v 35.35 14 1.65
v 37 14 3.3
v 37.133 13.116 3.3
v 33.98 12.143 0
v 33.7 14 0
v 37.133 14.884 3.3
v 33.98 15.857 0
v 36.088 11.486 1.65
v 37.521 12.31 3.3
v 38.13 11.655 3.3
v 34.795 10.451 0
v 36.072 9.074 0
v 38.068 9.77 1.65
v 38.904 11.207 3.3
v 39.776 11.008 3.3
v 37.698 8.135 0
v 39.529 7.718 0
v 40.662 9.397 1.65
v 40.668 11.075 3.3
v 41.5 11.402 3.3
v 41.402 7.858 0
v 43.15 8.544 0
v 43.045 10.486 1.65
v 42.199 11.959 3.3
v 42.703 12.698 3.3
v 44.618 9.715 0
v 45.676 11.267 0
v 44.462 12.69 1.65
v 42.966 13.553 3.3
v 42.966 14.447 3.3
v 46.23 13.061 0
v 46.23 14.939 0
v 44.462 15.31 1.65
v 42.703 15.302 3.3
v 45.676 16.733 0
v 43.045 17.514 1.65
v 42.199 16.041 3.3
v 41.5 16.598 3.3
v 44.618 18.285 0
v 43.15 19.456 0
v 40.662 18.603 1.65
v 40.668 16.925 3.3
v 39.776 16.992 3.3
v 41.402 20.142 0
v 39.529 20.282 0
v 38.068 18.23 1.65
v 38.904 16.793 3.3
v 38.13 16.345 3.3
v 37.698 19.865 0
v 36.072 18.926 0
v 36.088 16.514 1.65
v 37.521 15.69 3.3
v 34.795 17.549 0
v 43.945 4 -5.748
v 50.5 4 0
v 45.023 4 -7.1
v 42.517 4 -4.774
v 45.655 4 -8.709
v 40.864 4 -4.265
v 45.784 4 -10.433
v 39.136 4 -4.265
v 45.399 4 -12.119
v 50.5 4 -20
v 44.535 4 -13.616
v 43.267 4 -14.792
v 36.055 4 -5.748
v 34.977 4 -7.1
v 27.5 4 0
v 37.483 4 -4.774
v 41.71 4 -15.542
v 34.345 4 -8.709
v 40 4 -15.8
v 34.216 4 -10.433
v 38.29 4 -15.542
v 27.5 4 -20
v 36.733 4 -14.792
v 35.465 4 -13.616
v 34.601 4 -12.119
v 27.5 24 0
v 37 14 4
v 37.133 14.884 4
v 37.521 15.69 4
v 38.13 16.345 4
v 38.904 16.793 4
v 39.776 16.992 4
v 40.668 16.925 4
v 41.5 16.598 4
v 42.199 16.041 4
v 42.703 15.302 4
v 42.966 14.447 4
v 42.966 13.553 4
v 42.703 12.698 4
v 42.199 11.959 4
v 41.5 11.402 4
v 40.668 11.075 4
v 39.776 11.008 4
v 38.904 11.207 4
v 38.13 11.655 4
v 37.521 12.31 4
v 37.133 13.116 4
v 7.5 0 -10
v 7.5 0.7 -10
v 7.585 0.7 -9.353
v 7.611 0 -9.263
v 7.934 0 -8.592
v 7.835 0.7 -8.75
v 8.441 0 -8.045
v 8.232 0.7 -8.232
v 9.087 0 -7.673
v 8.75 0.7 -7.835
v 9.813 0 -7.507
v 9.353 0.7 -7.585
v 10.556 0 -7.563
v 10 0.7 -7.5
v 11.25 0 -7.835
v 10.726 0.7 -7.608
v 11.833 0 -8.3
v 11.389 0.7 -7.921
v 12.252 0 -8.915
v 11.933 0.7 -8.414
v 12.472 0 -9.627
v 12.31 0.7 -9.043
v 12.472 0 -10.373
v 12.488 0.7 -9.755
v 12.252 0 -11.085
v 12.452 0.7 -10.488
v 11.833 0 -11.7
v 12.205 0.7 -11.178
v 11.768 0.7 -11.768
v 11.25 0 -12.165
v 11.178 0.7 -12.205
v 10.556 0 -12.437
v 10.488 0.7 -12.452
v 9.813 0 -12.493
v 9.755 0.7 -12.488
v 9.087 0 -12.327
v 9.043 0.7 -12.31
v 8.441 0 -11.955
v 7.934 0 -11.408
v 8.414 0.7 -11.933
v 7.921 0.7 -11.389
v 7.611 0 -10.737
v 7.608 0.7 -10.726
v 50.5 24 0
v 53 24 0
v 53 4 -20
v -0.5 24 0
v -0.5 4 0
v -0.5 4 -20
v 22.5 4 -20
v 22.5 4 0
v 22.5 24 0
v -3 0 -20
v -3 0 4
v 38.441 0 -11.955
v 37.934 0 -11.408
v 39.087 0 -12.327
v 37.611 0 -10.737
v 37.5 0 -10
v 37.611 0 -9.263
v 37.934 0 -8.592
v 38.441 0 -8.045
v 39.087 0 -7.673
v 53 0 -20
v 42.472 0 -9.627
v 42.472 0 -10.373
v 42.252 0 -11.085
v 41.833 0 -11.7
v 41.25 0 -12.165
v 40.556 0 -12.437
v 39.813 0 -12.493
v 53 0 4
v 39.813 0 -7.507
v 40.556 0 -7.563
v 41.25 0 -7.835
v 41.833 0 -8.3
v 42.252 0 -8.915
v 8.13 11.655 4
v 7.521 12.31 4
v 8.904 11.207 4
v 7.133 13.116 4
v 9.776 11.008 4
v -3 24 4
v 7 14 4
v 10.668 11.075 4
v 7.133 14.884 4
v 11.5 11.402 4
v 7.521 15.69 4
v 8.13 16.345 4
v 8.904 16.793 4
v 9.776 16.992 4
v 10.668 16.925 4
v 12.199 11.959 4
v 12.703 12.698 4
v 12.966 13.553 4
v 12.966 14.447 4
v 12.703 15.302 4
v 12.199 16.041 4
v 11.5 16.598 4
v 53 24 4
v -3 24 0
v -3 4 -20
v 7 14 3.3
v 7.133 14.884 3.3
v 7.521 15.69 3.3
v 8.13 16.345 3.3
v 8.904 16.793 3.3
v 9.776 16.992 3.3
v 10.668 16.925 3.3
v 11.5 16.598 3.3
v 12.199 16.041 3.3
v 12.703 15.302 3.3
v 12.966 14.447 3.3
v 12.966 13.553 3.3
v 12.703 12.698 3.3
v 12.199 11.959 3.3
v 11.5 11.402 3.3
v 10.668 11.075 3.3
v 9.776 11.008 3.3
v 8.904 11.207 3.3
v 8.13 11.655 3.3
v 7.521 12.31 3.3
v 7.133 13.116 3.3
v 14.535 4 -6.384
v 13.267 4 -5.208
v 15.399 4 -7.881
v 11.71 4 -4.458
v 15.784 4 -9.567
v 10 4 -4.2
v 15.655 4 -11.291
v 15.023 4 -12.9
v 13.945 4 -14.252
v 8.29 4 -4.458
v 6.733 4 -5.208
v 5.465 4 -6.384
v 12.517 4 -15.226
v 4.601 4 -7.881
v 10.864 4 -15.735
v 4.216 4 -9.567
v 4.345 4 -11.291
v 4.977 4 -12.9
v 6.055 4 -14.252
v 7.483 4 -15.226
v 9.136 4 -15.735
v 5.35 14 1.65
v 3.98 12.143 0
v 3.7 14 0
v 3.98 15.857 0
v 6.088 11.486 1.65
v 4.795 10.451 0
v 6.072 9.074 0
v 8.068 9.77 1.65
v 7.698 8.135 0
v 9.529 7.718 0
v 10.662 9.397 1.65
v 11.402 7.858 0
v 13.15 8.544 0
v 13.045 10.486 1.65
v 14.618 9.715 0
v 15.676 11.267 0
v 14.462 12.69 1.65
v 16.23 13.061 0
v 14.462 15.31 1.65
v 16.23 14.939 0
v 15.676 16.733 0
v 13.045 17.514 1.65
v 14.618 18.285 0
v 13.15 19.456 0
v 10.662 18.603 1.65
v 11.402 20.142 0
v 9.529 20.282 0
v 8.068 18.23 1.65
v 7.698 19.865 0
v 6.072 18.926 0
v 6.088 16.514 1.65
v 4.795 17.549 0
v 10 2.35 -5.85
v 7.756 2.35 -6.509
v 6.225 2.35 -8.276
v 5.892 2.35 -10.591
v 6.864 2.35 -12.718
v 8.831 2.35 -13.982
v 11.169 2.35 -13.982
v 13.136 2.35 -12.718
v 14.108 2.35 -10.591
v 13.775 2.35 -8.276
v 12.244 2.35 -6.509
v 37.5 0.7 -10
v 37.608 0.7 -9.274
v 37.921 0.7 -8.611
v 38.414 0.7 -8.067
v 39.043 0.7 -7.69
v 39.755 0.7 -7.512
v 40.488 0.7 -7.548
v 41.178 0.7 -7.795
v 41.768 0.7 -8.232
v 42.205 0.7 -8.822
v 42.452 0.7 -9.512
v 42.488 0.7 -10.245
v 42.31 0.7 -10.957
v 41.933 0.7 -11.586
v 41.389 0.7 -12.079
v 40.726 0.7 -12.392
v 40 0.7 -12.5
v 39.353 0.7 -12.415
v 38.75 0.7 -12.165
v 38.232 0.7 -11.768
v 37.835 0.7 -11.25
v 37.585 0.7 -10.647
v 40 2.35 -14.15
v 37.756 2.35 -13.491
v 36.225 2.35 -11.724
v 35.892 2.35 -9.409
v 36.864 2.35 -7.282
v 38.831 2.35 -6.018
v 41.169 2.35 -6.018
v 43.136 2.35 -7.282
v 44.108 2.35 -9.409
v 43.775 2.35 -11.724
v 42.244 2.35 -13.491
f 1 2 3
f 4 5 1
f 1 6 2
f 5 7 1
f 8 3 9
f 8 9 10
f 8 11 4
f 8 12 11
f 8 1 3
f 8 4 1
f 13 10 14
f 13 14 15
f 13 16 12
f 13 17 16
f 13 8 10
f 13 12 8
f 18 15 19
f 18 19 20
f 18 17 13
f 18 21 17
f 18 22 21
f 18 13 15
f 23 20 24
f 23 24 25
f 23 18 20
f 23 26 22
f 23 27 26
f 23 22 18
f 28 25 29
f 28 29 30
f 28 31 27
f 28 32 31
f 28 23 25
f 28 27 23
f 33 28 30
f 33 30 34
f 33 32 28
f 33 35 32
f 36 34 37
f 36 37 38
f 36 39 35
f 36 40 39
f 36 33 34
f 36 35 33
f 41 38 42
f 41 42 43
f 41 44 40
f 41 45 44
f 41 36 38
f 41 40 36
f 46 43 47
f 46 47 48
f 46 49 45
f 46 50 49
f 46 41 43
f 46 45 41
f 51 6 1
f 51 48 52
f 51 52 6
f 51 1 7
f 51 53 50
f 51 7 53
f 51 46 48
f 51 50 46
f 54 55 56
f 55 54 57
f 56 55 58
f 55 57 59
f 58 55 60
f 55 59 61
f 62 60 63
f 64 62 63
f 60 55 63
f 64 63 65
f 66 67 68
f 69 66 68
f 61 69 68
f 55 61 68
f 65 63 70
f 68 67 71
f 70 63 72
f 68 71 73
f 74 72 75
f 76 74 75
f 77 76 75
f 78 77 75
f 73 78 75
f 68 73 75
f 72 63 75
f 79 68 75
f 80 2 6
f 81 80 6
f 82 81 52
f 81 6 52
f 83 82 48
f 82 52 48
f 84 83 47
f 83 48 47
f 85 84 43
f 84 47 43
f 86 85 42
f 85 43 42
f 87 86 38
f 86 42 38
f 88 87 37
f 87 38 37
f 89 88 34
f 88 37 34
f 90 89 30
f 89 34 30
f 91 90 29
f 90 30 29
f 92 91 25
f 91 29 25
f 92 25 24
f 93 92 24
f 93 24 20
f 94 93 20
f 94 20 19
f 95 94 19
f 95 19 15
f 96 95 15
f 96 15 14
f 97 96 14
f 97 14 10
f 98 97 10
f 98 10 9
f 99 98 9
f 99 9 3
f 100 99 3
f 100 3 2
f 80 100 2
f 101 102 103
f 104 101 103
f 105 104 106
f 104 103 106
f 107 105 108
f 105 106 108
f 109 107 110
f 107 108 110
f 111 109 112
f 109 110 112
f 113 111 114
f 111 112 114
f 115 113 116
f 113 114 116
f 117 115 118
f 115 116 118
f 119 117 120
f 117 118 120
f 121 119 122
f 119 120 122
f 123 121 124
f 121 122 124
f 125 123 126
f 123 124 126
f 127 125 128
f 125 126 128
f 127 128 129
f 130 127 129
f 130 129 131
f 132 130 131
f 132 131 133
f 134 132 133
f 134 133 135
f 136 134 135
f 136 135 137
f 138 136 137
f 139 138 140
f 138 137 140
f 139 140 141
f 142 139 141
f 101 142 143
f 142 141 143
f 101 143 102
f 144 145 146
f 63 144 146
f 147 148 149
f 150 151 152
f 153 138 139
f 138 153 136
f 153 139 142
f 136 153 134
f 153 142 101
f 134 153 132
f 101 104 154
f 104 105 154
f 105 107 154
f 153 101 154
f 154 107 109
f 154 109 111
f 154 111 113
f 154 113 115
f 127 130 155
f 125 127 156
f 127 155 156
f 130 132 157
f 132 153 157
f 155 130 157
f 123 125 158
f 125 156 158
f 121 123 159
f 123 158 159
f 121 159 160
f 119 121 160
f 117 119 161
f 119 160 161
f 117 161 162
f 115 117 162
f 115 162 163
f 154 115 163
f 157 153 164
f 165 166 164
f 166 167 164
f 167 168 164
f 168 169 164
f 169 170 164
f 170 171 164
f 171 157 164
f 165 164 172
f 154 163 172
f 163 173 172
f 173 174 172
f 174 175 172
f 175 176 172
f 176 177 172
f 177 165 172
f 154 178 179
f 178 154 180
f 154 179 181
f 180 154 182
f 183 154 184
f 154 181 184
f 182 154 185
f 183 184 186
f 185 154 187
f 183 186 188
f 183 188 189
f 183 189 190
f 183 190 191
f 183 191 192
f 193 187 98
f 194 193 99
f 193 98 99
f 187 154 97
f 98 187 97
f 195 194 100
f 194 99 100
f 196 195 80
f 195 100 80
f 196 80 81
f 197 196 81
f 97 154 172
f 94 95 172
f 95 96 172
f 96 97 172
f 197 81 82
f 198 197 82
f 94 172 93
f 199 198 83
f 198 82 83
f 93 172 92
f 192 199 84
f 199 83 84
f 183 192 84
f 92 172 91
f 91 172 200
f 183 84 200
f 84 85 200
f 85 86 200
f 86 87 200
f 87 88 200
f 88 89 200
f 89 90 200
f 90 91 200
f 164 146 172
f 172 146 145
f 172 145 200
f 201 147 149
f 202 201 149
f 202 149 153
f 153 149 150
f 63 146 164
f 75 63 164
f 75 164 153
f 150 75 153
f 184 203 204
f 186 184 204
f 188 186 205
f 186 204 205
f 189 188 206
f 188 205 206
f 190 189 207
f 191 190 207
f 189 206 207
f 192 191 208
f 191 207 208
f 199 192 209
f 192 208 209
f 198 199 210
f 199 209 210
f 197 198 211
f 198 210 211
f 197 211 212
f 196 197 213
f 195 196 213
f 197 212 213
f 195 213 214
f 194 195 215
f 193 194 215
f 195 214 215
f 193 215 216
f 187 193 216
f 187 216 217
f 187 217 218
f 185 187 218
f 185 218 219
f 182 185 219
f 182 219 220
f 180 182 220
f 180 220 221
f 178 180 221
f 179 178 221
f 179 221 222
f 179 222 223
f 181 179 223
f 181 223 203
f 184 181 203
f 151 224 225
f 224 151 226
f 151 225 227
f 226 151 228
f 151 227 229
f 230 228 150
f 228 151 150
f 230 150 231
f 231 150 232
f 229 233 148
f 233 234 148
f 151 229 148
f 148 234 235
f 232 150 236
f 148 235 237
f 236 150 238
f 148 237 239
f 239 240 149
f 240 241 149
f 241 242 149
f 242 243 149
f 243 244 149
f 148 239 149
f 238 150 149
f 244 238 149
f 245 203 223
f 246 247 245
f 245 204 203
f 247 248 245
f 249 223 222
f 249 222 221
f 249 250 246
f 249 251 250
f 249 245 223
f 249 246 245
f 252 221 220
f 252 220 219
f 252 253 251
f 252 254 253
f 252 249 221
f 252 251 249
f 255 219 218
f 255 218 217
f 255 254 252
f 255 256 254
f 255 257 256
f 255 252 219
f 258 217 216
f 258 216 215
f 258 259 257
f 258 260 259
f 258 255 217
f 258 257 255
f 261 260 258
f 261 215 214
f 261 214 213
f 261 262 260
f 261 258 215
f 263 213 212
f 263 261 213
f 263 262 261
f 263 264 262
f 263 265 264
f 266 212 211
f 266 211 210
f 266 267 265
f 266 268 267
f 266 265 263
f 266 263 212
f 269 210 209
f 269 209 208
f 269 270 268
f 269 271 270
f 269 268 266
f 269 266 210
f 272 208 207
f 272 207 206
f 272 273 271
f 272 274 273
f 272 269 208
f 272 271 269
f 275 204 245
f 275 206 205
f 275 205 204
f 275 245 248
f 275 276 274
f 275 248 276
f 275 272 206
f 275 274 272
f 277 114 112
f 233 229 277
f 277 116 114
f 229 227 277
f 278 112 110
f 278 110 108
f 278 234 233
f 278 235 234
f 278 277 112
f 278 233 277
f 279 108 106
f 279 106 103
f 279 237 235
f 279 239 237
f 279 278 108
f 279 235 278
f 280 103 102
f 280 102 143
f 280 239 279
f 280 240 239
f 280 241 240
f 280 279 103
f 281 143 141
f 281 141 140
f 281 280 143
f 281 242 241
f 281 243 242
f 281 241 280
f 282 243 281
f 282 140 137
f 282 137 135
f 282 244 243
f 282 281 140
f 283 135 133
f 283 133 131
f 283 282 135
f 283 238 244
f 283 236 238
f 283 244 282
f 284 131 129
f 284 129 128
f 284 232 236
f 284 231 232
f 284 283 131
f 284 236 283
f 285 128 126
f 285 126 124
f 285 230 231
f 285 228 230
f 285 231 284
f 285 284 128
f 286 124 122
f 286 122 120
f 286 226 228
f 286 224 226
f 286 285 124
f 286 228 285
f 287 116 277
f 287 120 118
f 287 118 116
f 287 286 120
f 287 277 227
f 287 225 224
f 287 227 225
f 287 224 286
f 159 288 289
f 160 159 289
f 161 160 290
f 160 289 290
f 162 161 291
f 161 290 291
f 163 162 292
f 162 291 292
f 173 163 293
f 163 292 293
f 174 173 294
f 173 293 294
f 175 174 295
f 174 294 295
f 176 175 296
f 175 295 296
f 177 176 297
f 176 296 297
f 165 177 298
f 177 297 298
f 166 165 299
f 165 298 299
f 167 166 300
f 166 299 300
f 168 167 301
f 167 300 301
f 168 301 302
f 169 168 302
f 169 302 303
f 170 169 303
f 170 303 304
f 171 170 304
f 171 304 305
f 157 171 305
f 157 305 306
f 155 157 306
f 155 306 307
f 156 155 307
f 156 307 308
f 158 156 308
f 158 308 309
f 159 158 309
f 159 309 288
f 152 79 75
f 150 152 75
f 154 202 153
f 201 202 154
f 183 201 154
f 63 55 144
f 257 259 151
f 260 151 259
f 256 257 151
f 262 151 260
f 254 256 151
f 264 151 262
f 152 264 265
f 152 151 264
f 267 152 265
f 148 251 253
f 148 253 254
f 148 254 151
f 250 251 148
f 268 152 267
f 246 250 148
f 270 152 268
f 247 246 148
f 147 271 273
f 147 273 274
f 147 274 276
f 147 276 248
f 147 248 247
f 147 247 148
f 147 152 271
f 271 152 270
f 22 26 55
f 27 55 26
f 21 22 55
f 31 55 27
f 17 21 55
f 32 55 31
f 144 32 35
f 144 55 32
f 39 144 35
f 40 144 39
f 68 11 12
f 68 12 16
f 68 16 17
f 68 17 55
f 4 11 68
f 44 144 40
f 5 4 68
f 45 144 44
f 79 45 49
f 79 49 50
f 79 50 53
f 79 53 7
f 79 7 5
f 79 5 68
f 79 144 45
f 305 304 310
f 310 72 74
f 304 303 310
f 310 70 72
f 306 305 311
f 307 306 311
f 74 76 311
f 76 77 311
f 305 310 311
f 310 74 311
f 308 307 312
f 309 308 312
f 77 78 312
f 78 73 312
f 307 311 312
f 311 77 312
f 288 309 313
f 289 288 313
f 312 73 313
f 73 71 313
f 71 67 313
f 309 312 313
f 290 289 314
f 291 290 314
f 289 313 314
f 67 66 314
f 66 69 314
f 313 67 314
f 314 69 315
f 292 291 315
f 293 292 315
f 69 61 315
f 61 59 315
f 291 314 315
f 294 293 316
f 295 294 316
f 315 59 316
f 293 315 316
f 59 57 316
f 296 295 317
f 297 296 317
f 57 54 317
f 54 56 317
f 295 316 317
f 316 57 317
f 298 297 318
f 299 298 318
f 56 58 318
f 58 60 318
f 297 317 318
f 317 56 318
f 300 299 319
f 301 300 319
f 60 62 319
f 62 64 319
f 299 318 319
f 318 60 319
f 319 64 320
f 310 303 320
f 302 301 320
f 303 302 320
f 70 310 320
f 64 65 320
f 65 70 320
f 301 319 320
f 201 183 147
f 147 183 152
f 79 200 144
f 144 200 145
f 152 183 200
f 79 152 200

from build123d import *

# Parameters (mm, degrees)
CROQUIS1_R                   = 2.5
SALIENTE_EXTRUIR1_DEPTH      = 4
CROQUIS2_W                   = 50
CROQUIS2_H                   = 4
SALIENTE_EXTRUIR2_DEPTH      = 20
SALIENTE_EXTRUIR3_DEPTH      = 3
SALIENTE_EXTRUIR3_DEPTH_BACK = 53
CROQUIS4_W                   = 23
CROQUIS4_H                   = 20
CORTAR_EXTRUIR1_DEPTH        = 20
CROQUIS5_R                   = 3
CORTAR_EXTRUIR2_DEPTH        = 17
CROQUIS6_R                   = 2.5
CORTAR_EXTRUIR3_DEPTH        = 20


with BuildPart() as part:
    # Croquis1 → Saliente-Extruir1 (new body)
    with BuildSketch(Plane(origin=(0, 0, 0), x_dir=(1, 0, 0), z_dir=(0, 1, 0))):
        Polygon((0, 0), (0, 20), (50, 20), (50, 0), (50, -4), (0, -4), align=None)
        with Locations(Location((10, 10, 0), (0, 0, 270))):
            Circle(CROQUIS1_R, mode=Mode.SUBTRACT)
        with Locations(Location((40, 10, 0), (0, 0, 270))):
            Circle(CROQUIS1_R, mode=Mode.SUBTRACT)
    extrude(amount=SALIENTE_EXTRUIR1_DEPTH)

    # Croquis2 → Saliente-Extruir2 (add)
    with BuildSketch(Plane(origin=(0, 4, 0), x_dir=(1, 0, 0), z_dir=(0, 1, 0))):
        with Locations((25, -2)):
            Rectangle(CROQUIS2_W, CROQUIS2_H)
    extrude(amount=SALIENTE_EXTRUIR2_DEPTH)

    # Croquis3 → Saliente-Extruir3 (add, two sides: drawn at the far end of the back side and taken through both)
    with BuildSketch(Plane.ZY.offset(-SALIENTE_EXTRUIR3_DEPTH_BACK)):
        Polygon((-20, 4), (-20, 0), (4, 0), (4, 24), (0, 24), align=None)
    extrude(amount=SALIENTE_EXTRUIR3_DEPTH + SALIENTE_EXTRUIR3_DEPTH_BACK)

    # Croquis4 → Cortar-Extruir1 (cut)
    with BuildSketch(Plane(origin=(0, 0, -20), x_dir=(-1, 0, 0), z_dir=(0, 0, -1))):
        with Locations((-39, 14)):
            Rectangle(CROQUIS4_W, CROQUIS4_H)
        with Locations((-11, 14)):
            Rectangle(CROQUIS4_W, CROQUIS4_H)
    extrude(amount=-CORTAR_EXTRUIR1_DEPTH, mode=Mode.SUBTRACT)

    # Croquis5 → Cortar-Extruir2 (cut)
    with BuildSketch(Plane(origin=(0, 0, 0), x_dir=(-1, 0, 0), z_dir=(0, 0, -1))):
        with Locations((-40, 14)):
            Circle(CROQUIS5_R)
        with Locations((-10, 14)):
            Circle(CROQUIS5_R)
    extrude(amount=-CORTAR_EXTRUIR2_DEPTH, mode=Mode.SUBTRACT)

    # Croquis6 → Cortar-Extruir3 (cut)
    with BuildSketch(Plane(origin=(0, 4, 0), x_dir=(1, 0, 0), z_dir=(0, 1, 0))):
        with Locations(Location((10, 10, 0), (0, 0, 180))):
            Circle(CROQUIS6_R)
        with Locations(Location((40, 10, 0), (0, 0, 180))):
            Circle(CROQUIS6_R)
    extrude(amount=-CORTAR_EXTRUIR3_DEPTH, mode=Mode.SUBTRACT)

    # Croquis7 → Cortar-Revolución1 (revolve, cut)
    with BuildSketch(Plane.XY.offset(-10), mode=Mode.PRIVATE) as cortar_revoluci_n1_sk:
        Polygon((40, 0.7), (37.5, 0.7), (34.2, 4), (40, 4), align=None)
    revolve(cortar_revoluci_n1_sk.sketch.rotate(Axis((40, 0.7, -10), (0, 1, 0)), 270), axis=Axis((40, 0.7, -10), (0, 1, 0)), mode=Mode.SUBTRACT)

    # Croquis8 → Cortar-Revolución2 (revolve, cut)
    with BuildSketch(Plane.XY.offset(-10), mode=Mode.PRIVATE) as cortar_revoluci_n2_sk:
        Polygon((10, 4), (10, 0.7), (12.5, 0.7), (15.8, 4), align=None)
    revolve(cortar_revoluci_n2_sk.sketch.rotate(Axis((10, 4, -10), (0, -1, 0)), 90), axis=Axis((10, 4, -10), (0, -1, 0)), mode=Mode.SUBTRACT)

    # Croquis9 → Cortar-Revolución3 (revolve, cut)
    with BuildSketch(Plane(origin=(0, 14, 0), x_dir=(1, 0, 0), z_dir=(0, 1, 0)), mode=Mode.PRIVATE) as cortar_revoluci_n3_sk:
        Polygon((40, 0), (40, -3.3), (43, -3.3), (46.3, 0), align=None)
    revolve(cortar_revoluci_n3_sk.sketch.rotate(Axis((40, 14, 0), (0, 0, 1)), 180), axis=Axis((40, 14, 0), (0, 0, 1)), mode=Mode.SUBTRACT)

    # Croquis10 → Cortar-Revolución4 (revolve, cut)
    with BuildSketch(Plane(origin=(0, 14, 0), x_dir=(1, 0, 0), z_dir=(0, 1, 0)), mode=Mode.PRIVATE) as cortar_revoluci_n4_sk:
        Polygon((10, 0), (10, -3.3), (13, -3.3), (16.3, 0), align=None)
    revolve(cortar_revoluci_n4_sk.sketch.rotate(Axis((10, 14, 0), (0, 0, 1)), 180), axis=Axis((10, 14, 0), (0, 0, 1)), mode=Mode.SUBTRACT)


solid = part.part
